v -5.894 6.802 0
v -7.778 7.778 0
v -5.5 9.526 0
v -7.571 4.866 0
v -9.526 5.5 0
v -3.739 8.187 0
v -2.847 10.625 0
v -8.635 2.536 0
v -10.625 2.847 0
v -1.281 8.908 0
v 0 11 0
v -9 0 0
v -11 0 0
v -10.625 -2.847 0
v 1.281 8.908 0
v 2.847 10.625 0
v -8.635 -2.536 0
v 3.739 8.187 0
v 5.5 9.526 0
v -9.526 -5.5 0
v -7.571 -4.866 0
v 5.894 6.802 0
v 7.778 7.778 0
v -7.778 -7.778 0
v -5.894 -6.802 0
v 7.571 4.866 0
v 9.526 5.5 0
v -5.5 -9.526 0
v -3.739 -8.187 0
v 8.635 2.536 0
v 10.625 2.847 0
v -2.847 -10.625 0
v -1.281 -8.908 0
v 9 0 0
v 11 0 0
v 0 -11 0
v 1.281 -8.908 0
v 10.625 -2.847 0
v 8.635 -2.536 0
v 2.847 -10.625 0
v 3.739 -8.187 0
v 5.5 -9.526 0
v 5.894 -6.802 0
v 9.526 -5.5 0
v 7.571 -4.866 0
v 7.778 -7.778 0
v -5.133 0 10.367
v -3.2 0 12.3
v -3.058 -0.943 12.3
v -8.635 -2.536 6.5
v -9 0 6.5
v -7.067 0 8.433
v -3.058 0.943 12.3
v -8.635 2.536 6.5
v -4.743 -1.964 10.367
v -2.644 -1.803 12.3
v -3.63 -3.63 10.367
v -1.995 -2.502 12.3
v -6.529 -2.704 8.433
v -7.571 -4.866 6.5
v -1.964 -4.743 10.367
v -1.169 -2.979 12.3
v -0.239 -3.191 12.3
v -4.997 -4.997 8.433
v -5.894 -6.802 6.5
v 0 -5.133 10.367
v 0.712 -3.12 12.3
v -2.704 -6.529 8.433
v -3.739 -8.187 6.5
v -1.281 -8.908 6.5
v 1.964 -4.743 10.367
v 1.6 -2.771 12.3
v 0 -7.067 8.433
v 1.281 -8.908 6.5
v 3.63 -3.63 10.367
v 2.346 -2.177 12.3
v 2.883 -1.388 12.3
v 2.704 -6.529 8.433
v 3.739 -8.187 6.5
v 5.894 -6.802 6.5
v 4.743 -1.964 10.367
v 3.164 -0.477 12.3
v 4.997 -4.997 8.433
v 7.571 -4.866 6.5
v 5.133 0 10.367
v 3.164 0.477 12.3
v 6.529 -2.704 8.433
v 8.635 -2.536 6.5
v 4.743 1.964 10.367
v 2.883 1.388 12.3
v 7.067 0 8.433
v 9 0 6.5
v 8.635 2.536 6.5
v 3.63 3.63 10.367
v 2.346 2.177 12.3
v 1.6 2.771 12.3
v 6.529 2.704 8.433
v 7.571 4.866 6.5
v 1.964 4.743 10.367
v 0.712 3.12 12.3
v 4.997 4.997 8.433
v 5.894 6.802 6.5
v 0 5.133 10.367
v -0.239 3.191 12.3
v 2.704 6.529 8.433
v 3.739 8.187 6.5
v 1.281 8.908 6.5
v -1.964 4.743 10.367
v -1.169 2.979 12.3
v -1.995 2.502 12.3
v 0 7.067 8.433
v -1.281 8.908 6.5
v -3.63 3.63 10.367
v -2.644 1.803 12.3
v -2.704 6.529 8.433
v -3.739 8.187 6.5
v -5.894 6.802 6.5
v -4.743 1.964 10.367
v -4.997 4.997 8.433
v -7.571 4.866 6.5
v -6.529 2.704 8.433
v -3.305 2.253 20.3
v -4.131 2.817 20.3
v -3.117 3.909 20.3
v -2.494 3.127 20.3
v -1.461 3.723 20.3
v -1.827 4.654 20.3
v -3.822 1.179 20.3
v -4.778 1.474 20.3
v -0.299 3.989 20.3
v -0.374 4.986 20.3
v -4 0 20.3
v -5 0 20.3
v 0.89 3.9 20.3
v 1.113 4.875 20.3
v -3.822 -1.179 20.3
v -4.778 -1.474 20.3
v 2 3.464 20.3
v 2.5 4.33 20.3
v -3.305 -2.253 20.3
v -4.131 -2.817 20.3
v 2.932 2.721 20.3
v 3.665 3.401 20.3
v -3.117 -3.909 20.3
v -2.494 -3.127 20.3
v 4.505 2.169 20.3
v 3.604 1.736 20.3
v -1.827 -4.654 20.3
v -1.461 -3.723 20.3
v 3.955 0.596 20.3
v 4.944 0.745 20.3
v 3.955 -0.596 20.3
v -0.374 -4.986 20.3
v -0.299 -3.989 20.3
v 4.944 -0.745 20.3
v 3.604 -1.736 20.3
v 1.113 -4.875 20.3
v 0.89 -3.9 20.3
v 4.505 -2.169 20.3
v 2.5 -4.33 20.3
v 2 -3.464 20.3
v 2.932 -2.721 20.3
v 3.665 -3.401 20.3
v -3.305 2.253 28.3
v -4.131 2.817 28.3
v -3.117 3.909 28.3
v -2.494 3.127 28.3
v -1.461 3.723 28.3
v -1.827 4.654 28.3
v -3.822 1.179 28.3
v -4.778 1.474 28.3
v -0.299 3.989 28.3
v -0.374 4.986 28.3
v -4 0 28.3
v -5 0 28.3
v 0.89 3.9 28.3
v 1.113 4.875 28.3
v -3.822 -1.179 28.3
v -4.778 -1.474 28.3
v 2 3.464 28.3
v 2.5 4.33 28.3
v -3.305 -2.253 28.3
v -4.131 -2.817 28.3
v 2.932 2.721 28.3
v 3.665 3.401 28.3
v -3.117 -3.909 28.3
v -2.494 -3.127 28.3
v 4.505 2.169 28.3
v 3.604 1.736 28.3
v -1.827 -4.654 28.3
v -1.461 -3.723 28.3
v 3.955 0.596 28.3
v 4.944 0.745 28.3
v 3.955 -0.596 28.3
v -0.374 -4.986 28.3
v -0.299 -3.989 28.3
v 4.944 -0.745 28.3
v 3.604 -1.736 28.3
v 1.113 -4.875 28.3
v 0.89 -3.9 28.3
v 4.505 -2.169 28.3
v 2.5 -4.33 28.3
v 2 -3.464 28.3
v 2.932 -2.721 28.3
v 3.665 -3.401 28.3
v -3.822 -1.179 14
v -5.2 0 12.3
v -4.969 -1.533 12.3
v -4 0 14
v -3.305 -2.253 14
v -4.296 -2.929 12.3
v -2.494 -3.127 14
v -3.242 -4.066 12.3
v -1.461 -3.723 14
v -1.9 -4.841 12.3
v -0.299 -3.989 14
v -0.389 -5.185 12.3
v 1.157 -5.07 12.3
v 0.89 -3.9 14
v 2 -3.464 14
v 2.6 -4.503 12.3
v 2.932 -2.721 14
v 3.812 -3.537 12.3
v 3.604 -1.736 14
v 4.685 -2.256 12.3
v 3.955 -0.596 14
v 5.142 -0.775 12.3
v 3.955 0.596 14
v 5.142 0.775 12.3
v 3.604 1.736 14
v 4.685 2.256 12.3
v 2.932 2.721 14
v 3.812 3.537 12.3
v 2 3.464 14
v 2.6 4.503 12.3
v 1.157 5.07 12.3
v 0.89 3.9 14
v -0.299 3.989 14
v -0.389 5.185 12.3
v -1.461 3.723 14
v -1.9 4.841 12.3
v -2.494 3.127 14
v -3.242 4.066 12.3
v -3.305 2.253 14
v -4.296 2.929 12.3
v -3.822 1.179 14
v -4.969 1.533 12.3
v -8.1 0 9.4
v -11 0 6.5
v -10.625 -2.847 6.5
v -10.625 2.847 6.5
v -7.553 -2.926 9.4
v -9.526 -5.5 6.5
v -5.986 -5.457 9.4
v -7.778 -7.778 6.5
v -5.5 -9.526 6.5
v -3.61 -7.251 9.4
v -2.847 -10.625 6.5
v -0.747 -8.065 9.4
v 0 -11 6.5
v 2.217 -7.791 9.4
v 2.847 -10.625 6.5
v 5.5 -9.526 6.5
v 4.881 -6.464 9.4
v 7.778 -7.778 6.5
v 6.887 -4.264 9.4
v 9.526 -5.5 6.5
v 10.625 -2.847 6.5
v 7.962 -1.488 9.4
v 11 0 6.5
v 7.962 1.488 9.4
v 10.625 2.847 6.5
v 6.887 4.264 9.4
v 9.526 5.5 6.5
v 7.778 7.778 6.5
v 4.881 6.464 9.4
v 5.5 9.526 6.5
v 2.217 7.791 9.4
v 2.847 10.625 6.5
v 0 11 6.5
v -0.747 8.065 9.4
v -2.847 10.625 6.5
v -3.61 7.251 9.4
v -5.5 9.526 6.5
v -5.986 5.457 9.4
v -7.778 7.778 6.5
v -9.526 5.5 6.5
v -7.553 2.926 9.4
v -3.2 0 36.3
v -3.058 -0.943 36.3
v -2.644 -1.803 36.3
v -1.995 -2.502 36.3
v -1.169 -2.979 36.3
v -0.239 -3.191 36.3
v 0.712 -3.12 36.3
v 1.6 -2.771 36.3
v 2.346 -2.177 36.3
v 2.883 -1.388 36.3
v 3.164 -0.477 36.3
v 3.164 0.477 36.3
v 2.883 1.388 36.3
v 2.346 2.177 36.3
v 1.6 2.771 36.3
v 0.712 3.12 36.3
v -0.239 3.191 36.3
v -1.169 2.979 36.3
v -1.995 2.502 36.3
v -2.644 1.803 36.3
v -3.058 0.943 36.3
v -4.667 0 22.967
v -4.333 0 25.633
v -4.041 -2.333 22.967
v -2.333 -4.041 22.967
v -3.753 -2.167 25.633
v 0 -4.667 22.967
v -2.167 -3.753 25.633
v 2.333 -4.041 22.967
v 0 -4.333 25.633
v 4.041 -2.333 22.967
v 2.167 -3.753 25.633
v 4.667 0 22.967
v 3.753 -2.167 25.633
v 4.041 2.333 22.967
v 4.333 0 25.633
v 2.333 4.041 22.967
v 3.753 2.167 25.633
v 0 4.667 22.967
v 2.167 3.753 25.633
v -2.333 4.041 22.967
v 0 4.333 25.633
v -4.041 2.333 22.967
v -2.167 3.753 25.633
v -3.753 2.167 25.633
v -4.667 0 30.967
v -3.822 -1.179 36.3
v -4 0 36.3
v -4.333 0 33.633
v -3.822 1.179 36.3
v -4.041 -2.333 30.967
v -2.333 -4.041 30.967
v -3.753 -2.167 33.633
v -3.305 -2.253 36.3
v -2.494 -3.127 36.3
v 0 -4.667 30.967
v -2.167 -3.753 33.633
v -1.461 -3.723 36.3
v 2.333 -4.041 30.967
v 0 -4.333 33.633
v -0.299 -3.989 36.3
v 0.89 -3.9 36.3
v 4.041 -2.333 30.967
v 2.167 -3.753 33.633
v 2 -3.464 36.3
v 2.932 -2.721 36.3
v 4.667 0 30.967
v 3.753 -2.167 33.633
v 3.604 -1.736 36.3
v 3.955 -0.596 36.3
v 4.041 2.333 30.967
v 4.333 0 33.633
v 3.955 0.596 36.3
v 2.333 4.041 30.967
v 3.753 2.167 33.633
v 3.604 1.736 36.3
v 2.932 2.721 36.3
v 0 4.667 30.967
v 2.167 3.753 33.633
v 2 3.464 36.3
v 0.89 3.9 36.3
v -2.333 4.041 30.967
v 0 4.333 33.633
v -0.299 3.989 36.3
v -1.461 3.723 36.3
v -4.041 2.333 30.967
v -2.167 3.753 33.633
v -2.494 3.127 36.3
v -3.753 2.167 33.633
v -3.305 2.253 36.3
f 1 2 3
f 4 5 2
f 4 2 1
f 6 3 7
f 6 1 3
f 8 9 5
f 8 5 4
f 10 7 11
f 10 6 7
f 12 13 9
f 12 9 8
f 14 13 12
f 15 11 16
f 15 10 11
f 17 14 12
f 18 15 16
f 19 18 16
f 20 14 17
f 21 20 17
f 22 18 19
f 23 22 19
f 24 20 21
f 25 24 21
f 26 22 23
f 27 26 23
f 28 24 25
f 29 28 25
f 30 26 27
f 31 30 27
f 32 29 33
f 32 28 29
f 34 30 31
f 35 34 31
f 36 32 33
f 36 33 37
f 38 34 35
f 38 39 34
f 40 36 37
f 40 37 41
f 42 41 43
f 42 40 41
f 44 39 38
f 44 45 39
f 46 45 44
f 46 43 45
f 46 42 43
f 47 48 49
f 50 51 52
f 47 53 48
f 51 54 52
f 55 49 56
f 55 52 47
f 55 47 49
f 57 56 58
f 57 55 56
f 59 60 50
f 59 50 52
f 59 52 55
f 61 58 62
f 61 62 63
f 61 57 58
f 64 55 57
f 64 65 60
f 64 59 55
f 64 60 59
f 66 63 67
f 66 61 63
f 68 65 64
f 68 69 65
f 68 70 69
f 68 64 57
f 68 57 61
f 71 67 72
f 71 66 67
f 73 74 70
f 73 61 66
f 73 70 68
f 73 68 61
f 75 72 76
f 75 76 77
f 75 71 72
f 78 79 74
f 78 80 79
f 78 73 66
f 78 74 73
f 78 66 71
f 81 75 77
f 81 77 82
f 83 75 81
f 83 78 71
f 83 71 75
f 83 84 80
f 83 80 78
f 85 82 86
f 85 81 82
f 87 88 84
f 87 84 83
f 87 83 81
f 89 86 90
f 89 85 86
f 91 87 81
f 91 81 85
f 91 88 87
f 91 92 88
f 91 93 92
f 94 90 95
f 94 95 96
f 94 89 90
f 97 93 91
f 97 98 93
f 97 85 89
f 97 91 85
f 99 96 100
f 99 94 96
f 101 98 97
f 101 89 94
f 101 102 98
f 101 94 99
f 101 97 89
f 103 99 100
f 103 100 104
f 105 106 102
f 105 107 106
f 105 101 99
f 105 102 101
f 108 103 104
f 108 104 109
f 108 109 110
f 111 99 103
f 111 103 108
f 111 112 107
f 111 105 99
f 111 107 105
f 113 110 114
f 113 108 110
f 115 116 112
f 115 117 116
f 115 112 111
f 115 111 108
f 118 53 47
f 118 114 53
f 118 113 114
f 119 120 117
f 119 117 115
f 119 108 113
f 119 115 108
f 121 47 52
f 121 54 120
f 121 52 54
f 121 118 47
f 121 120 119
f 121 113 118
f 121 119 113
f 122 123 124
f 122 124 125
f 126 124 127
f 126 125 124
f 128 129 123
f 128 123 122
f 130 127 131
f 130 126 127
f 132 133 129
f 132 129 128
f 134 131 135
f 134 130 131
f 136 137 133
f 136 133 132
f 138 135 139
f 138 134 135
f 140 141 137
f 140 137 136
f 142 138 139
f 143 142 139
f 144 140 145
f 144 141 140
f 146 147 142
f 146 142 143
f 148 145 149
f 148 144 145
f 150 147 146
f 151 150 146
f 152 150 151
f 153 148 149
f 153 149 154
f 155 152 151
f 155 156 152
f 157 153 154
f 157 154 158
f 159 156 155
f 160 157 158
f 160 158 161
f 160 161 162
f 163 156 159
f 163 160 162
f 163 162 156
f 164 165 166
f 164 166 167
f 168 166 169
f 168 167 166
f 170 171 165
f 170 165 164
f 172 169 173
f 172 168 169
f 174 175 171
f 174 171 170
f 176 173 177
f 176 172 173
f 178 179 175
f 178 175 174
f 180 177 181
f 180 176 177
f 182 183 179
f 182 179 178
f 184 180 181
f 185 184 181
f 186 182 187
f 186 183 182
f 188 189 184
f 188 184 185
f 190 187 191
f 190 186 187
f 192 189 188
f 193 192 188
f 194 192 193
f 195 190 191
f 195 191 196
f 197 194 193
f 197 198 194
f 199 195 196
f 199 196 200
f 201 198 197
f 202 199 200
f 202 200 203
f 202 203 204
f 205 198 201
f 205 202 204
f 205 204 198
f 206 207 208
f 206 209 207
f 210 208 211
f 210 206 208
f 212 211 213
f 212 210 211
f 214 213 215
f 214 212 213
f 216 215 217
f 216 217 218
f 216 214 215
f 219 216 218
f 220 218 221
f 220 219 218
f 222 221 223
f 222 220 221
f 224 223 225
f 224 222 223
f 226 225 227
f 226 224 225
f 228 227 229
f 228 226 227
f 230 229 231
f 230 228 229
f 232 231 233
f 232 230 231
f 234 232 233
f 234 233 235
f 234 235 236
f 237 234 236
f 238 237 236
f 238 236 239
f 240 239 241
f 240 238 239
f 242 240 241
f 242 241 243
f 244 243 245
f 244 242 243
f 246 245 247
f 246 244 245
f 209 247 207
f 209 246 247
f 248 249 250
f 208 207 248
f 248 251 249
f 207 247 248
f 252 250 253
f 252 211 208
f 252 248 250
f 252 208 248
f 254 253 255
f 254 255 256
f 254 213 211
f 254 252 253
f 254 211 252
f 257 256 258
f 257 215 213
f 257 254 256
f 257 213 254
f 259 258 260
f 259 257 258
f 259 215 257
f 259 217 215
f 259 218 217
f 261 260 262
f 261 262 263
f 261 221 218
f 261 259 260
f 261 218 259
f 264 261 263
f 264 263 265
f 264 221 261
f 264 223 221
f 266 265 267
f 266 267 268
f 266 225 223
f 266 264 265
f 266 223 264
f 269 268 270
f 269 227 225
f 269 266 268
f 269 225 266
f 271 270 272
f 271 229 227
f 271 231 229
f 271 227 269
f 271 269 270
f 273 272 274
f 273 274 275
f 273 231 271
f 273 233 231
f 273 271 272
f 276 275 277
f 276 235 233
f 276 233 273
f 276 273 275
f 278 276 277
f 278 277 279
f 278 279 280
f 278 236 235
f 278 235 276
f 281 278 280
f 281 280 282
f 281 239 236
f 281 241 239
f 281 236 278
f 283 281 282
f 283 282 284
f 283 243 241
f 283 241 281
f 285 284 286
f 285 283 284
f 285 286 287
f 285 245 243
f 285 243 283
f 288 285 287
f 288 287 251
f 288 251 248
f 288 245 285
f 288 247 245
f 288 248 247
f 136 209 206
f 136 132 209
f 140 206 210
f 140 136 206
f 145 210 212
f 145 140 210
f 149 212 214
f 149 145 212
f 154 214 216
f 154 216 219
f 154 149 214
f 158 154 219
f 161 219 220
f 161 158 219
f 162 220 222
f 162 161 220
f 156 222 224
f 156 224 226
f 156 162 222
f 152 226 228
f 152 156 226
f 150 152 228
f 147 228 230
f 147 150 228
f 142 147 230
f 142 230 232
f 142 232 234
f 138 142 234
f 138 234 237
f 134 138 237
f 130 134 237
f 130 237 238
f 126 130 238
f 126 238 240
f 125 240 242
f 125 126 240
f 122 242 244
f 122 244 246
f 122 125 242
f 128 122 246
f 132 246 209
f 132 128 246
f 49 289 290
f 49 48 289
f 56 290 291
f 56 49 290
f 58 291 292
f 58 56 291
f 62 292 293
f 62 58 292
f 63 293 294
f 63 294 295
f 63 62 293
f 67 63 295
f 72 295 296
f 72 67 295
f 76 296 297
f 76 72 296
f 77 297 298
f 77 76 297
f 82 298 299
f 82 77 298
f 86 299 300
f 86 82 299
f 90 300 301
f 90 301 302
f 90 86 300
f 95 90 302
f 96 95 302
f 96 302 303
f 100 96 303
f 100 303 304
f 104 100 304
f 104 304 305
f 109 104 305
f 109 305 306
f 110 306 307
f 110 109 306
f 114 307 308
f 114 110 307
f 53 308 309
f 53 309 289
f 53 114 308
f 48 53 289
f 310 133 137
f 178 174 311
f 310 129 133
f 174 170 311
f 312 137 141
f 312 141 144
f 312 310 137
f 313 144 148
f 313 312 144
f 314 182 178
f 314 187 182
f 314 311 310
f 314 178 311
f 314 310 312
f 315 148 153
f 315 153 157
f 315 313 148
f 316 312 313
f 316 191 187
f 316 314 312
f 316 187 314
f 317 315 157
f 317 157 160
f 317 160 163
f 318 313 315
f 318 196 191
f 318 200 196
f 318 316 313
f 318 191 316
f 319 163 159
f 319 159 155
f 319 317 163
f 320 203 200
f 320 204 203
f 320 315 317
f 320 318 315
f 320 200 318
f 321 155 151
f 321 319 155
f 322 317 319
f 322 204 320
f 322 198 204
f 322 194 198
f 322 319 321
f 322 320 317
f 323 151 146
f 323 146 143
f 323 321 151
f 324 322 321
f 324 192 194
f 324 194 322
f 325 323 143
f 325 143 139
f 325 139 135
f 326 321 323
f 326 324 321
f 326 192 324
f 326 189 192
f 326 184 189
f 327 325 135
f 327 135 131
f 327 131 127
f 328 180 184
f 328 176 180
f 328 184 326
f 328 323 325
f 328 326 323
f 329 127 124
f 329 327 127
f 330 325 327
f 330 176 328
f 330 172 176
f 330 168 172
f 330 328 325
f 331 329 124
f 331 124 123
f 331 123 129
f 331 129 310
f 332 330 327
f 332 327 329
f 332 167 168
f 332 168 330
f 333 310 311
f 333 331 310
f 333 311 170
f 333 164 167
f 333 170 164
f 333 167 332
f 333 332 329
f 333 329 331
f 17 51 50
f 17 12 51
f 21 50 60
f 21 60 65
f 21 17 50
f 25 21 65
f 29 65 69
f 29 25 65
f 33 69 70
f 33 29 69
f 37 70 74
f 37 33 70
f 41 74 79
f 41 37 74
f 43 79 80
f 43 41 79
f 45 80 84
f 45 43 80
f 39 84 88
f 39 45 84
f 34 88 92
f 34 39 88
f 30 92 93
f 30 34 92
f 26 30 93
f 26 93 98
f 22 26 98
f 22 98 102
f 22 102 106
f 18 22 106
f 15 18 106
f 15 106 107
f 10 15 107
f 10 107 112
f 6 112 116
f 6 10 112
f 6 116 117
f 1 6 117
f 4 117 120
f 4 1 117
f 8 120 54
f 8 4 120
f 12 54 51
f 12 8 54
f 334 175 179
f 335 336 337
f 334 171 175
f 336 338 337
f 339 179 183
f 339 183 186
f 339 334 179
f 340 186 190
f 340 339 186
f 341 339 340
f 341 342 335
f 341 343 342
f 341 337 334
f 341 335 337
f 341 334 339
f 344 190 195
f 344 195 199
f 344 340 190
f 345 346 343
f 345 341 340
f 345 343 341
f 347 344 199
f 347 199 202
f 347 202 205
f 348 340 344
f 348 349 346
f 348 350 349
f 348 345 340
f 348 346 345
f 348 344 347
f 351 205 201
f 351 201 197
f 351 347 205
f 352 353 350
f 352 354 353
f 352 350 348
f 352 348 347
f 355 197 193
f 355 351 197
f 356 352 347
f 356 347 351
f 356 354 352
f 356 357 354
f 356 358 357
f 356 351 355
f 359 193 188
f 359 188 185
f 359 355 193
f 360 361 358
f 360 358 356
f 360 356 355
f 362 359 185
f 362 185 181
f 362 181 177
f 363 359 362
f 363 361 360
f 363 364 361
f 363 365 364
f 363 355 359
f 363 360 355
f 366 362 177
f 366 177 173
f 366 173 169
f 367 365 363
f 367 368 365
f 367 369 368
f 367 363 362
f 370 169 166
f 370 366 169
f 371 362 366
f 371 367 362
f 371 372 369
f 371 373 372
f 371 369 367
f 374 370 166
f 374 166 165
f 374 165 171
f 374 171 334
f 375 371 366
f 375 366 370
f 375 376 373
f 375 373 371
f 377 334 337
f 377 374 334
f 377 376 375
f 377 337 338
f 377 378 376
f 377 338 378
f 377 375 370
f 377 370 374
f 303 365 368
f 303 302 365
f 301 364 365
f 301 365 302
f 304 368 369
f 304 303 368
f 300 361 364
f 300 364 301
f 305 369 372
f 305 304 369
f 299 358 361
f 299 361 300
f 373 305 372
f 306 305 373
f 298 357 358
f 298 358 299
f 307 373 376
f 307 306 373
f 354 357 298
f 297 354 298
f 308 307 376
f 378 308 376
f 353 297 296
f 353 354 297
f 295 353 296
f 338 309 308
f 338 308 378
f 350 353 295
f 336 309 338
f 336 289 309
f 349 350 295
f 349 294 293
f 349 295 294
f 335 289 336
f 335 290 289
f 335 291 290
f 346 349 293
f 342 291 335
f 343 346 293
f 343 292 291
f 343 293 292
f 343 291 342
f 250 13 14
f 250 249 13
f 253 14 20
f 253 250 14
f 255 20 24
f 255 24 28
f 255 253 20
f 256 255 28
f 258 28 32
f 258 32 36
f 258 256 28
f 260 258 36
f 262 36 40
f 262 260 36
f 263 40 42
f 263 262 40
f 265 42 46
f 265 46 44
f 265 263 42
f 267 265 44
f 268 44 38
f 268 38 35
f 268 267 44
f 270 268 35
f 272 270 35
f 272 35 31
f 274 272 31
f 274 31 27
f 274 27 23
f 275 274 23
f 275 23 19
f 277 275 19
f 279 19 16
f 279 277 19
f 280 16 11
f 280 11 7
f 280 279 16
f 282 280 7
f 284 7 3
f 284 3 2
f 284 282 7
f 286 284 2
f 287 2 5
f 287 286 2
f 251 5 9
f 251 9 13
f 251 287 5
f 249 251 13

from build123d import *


with BuildPart() as part:
    # Sketch → Revolution (revolve)
    with BuildSketch(Plane.XZ):
        Polygon((-9, 0), (-11, 0), (-11, 6.5), (-5.2, 12.3), (-4, 14), (-4, 20.3), (-5, 20.3), (-4, 28.3), (-5, 28.3), (-4, 36.3), (-3.2, 36.3), (-3.2, 12.3), (-9, 6.5), align=None)
    revolve(axis=Axis((0, 0, 0), (0, 0, 1)))


solid = part.part
